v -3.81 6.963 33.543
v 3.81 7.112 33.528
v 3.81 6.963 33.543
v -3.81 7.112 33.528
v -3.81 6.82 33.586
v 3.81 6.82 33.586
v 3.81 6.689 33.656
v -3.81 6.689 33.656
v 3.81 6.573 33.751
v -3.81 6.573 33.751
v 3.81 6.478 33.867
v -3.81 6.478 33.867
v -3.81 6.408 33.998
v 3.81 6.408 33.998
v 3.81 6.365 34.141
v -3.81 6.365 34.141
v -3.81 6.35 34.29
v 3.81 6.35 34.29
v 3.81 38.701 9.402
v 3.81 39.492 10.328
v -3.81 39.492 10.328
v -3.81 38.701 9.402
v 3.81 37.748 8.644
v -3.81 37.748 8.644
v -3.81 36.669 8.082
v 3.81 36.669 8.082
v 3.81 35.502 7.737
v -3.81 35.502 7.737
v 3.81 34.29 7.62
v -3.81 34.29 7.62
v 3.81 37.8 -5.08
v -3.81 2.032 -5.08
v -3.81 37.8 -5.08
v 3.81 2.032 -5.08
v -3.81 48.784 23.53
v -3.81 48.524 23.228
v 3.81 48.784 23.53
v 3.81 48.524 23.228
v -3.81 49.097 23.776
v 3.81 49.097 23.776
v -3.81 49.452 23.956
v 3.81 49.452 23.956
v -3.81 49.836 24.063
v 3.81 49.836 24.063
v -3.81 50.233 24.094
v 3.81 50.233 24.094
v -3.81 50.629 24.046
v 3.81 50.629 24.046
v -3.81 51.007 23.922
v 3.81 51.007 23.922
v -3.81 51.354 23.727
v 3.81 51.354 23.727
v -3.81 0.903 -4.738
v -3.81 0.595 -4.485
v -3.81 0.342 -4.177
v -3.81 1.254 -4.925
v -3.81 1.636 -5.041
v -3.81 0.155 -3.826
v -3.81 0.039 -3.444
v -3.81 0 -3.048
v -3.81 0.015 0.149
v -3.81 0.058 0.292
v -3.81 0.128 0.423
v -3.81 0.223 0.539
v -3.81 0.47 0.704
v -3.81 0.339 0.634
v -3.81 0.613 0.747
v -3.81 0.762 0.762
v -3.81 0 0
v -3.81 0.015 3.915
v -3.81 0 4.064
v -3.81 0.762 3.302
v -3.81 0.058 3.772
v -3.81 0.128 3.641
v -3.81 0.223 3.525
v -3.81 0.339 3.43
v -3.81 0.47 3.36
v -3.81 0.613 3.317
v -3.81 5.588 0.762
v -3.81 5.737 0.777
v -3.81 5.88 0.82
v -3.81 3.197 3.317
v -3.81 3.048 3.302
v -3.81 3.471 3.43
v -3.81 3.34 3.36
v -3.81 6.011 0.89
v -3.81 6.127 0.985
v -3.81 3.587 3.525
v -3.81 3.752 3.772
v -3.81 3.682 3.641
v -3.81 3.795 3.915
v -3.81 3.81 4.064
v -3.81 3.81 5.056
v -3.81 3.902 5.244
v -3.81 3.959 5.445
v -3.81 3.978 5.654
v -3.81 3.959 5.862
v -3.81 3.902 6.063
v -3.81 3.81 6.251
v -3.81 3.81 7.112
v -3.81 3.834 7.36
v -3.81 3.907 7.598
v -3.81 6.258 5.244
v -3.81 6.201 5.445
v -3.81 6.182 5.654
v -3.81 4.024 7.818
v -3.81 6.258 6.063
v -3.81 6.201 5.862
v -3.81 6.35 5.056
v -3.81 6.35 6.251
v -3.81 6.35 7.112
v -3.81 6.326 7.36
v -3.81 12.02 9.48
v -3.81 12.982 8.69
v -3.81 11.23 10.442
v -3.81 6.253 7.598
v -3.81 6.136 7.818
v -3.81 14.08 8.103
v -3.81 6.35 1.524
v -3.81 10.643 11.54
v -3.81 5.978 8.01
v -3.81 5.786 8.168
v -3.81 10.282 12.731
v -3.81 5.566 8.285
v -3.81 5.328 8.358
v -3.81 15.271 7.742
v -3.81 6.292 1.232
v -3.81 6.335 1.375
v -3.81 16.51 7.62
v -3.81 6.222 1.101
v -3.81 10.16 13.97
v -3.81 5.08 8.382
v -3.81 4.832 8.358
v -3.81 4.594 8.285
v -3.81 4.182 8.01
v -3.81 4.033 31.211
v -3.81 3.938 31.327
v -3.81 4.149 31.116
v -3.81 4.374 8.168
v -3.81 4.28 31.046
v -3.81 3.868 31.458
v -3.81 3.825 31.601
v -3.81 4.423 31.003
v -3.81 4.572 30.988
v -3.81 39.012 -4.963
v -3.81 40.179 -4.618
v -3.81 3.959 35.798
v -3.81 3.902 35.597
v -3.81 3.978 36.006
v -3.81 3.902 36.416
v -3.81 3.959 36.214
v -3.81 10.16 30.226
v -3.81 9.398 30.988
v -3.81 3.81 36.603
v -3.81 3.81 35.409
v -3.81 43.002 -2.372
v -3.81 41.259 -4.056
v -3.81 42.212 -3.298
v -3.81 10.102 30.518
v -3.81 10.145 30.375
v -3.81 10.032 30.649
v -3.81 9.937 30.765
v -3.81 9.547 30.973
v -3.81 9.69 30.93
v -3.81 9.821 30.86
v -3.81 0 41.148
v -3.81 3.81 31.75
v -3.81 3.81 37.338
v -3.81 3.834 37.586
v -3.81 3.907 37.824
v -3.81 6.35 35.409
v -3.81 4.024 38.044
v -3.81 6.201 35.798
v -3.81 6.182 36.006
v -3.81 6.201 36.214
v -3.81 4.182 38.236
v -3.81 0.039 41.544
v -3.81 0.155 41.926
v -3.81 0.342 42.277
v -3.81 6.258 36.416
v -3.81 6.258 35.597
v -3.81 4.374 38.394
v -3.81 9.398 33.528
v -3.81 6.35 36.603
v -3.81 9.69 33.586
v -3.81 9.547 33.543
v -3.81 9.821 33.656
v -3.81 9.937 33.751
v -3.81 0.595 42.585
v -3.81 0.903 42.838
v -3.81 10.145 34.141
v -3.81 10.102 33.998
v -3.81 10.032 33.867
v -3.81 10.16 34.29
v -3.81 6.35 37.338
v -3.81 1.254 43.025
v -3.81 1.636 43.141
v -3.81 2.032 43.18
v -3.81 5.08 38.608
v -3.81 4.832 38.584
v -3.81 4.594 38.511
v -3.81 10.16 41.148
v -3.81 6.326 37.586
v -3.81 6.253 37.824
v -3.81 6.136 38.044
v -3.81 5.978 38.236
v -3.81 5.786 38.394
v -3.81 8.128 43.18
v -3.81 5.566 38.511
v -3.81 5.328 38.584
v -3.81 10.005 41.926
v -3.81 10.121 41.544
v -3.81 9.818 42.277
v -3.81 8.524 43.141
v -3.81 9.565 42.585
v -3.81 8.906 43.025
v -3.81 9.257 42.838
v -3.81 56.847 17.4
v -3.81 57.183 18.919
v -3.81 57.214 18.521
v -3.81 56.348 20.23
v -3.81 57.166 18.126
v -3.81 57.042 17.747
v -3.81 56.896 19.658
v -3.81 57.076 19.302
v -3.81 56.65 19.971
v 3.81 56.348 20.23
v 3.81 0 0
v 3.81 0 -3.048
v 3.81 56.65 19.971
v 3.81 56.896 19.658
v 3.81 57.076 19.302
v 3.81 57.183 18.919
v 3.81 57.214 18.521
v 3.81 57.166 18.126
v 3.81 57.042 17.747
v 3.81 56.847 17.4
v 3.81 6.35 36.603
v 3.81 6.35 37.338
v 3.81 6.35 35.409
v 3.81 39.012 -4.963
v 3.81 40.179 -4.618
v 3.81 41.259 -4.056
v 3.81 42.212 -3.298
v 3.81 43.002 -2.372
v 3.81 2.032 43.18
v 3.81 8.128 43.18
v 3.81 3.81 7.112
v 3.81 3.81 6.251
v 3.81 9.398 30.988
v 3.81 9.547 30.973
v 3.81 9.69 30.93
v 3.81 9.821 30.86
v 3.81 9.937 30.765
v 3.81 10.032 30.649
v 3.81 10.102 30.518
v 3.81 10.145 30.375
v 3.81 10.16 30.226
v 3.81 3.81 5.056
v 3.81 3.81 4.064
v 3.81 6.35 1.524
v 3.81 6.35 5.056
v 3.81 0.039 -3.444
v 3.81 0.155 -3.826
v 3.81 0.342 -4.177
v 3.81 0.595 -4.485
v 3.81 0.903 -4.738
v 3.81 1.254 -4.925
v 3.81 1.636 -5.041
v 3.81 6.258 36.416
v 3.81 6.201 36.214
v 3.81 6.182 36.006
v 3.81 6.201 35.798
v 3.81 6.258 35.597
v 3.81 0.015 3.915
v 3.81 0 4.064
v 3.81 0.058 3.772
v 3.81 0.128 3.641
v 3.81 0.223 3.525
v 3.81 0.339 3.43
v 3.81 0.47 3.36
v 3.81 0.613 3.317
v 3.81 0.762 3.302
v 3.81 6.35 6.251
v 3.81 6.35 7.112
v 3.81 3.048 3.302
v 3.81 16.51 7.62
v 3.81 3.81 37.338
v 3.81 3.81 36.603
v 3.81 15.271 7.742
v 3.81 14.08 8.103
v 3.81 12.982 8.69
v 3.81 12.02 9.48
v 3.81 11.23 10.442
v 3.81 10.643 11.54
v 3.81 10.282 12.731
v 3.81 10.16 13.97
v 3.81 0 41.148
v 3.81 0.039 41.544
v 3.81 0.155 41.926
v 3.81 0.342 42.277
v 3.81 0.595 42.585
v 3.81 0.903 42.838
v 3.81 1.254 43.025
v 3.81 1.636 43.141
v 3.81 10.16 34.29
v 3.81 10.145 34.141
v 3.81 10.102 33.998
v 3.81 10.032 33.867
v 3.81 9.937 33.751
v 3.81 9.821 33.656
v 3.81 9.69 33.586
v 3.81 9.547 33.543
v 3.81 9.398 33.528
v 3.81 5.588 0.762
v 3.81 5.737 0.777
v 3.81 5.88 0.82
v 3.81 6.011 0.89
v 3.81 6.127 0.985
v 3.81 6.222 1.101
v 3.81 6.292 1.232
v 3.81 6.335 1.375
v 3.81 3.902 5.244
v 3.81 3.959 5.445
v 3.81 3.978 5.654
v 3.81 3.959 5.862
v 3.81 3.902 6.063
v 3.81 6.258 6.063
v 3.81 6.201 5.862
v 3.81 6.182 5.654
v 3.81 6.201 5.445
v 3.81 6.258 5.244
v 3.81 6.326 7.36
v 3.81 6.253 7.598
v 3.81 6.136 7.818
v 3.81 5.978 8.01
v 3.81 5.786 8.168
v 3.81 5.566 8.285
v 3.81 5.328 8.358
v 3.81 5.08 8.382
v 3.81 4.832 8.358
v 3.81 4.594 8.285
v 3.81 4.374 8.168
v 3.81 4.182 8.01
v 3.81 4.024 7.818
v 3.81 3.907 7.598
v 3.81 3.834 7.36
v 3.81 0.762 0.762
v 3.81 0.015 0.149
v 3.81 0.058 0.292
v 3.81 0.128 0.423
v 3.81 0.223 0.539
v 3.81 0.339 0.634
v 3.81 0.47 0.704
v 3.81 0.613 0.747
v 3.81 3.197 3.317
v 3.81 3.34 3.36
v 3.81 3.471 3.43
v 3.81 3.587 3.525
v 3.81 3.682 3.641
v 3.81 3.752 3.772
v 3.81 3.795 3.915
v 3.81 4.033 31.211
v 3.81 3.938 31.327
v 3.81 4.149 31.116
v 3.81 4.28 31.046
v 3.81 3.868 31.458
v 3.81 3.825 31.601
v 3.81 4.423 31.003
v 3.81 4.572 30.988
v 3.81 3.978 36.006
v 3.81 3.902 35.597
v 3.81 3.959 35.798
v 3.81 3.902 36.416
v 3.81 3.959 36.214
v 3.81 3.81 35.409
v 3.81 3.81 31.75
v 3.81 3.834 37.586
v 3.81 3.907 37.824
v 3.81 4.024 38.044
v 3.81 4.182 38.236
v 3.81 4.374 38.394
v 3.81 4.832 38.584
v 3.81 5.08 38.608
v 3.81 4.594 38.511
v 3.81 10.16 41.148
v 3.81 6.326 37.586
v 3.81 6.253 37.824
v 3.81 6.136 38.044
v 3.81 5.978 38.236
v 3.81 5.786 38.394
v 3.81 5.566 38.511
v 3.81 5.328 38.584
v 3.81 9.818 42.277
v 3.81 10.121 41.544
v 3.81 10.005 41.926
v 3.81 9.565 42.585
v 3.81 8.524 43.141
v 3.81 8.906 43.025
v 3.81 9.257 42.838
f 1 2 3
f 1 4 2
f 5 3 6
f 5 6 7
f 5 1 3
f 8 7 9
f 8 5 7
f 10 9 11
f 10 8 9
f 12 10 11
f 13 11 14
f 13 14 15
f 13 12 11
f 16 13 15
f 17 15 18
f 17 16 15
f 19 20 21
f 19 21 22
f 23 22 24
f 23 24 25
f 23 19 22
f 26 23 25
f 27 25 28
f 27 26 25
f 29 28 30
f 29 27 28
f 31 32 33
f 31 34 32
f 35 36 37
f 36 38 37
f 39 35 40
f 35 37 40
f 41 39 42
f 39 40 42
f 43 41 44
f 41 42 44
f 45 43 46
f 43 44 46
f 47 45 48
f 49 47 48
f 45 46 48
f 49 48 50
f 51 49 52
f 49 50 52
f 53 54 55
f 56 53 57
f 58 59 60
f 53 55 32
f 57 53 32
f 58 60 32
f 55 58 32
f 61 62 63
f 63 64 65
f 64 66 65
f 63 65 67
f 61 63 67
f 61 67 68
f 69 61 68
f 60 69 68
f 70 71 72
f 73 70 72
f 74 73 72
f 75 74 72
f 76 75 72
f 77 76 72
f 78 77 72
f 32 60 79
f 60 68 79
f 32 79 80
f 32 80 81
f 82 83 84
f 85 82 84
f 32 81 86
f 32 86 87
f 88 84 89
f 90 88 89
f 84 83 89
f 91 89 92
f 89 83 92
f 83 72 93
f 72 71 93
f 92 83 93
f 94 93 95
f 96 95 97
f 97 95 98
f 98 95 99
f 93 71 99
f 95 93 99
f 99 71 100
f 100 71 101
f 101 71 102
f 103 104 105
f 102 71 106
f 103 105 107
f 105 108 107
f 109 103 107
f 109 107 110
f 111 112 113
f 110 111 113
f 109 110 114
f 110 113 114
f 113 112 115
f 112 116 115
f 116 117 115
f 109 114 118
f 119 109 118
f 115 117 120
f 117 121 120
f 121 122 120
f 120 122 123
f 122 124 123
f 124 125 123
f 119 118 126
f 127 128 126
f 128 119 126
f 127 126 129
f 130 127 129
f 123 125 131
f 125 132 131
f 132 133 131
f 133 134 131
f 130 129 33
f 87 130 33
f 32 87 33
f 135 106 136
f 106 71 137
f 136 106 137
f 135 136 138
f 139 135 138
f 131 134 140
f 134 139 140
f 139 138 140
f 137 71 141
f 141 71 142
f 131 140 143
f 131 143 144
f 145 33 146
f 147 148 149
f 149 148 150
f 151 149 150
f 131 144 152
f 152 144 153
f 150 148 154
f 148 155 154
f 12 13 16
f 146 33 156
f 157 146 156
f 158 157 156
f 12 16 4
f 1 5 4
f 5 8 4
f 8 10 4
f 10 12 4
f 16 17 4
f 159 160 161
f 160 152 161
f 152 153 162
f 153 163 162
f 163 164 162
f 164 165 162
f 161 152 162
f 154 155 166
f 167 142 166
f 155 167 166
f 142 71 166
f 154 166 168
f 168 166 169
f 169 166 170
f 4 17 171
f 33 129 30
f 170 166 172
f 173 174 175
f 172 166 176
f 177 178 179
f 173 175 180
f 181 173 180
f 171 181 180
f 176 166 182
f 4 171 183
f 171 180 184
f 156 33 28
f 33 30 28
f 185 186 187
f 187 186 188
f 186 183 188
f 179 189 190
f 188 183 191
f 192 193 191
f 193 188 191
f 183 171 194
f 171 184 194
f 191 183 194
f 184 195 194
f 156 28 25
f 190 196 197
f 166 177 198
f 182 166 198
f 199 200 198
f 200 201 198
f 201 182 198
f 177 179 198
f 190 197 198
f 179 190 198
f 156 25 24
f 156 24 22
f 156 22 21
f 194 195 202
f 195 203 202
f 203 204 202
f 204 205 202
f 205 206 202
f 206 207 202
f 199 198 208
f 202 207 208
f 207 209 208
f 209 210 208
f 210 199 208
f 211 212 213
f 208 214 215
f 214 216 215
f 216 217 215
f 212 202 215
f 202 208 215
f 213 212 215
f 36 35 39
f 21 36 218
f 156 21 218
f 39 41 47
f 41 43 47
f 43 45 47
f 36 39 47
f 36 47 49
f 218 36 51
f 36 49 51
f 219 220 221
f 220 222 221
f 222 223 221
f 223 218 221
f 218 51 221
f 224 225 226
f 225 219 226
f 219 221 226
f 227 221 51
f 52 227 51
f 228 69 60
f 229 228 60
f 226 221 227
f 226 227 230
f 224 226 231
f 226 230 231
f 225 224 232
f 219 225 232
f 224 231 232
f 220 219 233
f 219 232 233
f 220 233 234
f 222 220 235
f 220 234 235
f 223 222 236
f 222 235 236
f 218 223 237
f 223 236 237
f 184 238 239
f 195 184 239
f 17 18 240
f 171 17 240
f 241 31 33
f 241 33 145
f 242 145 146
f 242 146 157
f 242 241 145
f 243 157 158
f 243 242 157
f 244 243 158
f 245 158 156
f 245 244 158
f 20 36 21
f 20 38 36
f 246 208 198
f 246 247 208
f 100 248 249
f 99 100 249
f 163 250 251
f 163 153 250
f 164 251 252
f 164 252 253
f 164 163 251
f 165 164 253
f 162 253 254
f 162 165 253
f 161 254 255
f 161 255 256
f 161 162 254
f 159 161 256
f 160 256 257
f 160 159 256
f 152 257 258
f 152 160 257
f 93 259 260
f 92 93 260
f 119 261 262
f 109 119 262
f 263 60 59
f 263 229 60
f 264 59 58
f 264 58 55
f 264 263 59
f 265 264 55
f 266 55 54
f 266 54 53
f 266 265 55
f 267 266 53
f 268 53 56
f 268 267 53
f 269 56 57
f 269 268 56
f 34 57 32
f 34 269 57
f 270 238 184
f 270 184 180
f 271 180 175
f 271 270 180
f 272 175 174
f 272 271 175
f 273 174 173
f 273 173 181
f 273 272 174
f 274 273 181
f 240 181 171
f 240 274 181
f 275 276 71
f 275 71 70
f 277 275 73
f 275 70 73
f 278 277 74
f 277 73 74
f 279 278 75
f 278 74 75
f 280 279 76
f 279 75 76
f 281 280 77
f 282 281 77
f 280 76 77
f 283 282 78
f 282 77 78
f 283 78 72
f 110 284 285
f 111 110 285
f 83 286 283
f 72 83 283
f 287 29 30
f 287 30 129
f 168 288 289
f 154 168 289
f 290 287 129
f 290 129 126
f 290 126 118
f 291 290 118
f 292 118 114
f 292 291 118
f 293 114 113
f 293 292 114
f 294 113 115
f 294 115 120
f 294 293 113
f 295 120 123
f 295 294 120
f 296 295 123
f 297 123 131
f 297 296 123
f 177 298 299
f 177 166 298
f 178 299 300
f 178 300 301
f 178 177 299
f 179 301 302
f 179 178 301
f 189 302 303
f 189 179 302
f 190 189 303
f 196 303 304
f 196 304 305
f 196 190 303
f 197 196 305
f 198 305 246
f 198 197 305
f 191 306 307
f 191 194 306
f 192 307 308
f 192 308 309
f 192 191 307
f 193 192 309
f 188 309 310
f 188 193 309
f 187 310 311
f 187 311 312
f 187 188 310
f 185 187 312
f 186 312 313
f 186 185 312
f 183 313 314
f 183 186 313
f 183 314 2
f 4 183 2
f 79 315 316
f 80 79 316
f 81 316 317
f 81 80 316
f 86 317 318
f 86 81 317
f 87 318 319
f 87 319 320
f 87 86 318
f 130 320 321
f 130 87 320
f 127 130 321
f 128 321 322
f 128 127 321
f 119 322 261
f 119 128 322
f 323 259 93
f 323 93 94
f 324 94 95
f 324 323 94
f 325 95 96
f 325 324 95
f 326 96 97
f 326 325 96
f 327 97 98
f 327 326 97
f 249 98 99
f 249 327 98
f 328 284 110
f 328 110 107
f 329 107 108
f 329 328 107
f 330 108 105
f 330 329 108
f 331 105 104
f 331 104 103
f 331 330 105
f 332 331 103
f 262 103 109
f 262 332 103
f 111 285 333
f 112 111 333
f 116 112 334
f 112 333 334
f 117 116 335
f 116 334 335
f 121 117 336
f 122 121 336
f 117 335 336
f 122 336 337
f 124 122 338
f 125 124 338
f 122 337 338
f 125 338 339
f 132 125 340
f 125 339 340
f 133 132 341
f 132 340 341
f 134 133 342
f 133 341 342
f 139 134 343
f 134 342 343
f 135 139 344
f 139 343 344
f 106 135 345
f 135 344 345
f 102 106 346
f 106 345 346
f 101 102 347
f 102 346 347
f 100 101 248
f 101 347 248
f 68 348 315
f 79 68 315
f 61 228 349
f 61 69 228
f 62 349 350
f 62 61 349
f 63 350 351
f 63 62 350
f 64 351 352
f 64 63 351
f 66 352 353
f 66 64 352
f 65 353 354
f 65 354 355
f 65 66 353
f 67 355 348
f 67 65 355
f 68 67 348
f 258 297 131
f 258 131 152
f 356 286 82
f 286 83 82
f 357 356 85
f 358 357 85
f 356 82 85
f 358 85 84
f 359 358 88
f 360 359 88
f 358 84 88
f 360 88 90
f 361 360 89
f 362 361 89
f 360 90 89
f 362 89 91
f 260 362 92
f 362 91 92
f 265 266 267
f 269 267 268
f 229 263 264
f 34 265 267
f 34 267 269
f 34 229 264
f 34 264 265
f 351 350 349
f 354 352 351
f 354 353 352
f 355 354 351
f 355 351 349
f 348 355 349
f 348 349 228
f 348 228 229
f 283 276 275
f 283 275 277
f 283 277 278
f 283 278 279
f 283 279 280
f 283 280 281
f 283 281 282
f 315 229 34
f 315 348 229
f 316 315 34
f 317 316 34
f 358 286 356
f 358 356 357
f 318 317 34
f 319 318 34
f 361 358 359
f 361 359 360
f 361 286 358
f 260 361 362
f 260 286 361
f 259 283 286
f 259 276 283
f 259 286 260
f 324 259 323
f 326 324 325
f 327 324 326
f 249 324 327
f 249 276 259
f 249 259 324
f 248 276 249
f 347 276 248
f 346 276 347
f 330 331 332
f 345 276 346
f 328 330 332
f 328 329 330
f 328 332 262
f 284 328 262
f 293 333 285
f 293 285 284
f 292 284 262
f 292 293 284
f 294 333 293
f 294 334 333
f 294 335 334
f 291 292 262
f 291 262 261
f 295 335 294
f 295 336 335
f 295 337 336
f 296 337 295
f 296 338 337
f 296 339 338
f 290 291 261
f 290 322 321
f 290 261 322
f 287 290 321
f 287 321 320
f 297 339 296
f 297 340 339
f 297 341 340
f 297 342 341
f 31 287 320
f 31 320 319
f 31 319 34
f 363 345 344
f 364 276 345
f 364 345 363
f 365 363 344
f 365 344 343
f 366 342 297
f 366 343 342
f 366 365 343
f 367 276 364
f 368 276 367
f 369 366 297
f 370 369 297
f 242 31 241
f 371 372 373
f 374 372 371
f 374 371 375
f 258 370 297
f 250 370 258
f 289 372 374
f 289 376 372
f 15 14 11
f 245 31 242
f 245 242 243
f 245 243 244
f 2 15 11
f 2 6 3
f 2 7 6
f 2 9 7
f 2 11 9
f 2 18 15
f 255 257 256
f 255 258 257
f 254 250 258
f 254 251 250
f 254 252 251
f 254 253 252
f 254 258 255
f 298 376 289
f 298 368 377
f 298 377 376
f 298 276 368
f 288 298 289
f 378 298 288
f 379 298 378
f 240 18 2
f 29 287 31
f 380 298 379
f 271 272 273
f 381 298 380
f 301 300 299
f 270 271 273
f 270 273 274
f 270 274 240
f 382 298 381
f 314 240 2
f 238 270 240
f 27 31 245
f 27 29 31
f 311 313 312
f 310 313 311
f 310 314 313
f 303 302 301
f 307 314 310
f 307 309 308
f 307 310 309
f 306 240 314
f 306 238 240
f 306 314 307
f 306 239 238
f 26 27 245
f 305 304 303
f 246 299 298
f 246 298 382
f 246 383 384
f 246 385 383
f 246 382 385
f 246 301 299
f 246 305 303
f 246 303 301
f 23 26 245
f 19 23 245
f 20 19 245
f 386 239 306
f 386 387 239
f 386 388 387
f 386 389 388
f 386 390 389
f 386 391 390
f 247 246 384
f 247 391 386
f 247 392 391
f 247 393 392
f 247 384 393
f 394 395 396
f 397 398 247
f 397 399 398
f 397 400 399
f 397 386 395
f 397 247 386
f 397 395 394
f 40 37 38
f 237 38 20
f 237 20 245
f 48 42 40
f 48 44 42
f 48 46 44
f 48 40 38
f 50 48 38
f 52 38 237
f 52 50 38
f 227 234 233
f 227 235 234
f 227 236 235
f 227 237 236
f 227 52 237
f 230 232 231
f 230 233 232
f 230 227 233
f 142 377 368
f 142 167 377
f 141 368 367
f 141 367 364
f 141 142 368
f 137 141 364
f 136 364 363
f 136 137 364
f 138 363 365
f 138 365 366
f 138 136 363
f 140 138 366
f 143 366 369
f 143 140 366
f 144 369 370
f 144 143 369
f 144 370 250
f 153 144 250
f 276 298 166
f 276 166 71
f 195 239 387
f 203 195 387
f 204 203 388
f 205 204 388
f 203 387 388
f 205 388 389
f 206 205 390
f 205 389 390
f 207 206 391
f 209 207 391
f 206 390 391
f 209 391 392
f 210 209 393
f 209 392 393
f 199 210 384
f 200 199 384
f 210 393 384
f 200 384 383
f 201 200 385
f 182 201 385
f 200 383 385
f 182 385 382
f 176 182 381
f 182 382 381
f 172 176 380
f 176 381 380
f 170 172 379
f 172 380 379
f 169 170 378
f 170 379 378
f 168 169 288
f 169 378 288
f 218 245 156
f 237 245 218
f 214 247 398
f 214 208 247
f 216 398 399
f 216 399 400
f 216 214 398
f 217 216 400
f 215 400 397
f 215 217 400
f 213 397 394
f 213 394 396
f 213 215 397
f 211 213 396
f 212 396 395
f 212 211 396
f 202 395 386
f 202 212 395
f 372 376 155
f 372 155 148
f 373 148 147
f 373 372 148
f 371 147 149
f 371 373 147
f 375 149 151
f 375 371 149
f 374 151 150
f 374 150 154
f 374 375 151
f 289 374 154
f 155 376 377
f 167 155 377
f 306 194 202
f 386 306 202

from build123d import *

# Parameters (mm, degrees)
F1_DEPTH = 3.81
F2_R     = 2.032
F4_DEPTH = 7.621
F5_R     = 0.762
F7_DEPTH = 7.62


# Not quite as in the source:
# - a feature names something its author has since deleted; it is built from what else it names


with BuildPart() as f1:
    # F0 (on Right) → F1 (new body, symmetric)
    with BuildSketch(Plane.YZ):
        with BuildLine():
            Line((0, 43.18), (0, 0))
            Line((0, 0), (0, -5.08))
            Line((0, -5.08), (37.8004340866, -5.08))
            ThreePointArc((37.8004340866, -5.08), (40.7325377806, -4.3625187907), (43.0020495678, -2.3722103708))
            Line((43.0020495678, -2.3722103708), (58.0123892895, 19.0647763833))
            Line((58.0123892895, 19.0647763833), (49.6898045196, 24.8923129766))
            Line((49.6898045196, 24.8923129766), (39.4916154812, 10.3277896292))
            ThreePointArc((39.4916154812, 10.3277896292), (37.222103694, 8.3374812093), (34.29, 7.62))
            Line((34.29, 7.62), (16.51, 7.62))
            ThreePointArc((16.51, 7.62), (12.0198719395, 9.4798719395), (10.16, 13.97))
            Line((10.16, 13.97), (10.16, 43.18))
            Line((10.16, 43.18), (0, 43.18))
        make_face()
    extrude(amount=F1_DEPTH, both=True)

    # F2
    f2_edges = [f1.edges().sort_by_distance(p)[0] for p in [
        (0, 10.16, 43.18),
        (0, 0, 43.18),
        (0, 49.689805, 24.892313),
        (0, 58.012389, 19.064776),
        (0, 0, -5.08),
    ]]
    fillet(f2_edges, radius=F2_R)

    # F3 (on face) → F4 (cut, through all)
    with BuildSketch(Plane.YZ.offset(3.81)):
        with BuildLine():
            Line((6.35, 33.528), (6.35, 37.338))
            ThreePointArc((6.35, 37.338), (5.08, 38.608), (3.81, 37.338))
            Line((3.81, 37.338), (3.81, 30.988))
            Line((3.81, 30.988), (10.16, 30.988))
            Line((10.16, 30.988), (10.16, 33.528))
            Line((10.16, 33.528), (6.35, 33.528))
        make_face()
        with BuildLine():
            Line((6.35, 0.762), (6.35, 7.112))
            ThreePointArc((6.35, 7.112), (5.08, 8.382), (3.81, 7.112))
            Line((3.81, 7.112), (3.81, 3.302))
            Line((3.81, 3.302), (0, 3.302))
            Line((0, 3.302), (0, 0.762))
            Line((0, 0.762), (6.35, 0.762))
        make_face()
    extrude(amount=-F4_DEPTH, mode=Mode.SUBTRACT)

    # F5
    f5_edges = [f1.edges().sort_by_distance(p)[0] for p in [
        (0, 6.35, 33.528),
        (0, 10.16, 33.528),
        (0, 3.81, 30.988),
        (0, 10.16, 30.988),
        (0, 0, 3.302),
        (0, 6.35, 0.762),
        (0, 0, 0.762),
        (0, 3.81, 3.302),
    ]]
    fillet(f5_edges, radius=F5_R)

    # F6 (on face) → F7 (join, through all)
    with BuildSketch(Plane.YZ.offset(3.81)):
        with BuildLine():
            Line((6.35, 35.4090145557), (6.35, 36.6031861632))
            ThreePointArc((6.35, 36.6031861632), (6.1816473942, 36.0061003594), (6.35, 35.4090145557))
        make_face()
        with BuildLine():
            Line((3.81, 36.6031861632), (3.81, 35.4090145557))
            ThreePointArc((3.81, 35.4090145557), (3.9783526058, 36.0061003594), (3.81, 36.6031861632))
        make_face()
        with BuildLine():
            Line((3.81, 6.2505925306), (3.81, 5.0564209231))
            ThreePointArc((3.81, 5.0564209231), (3.9783526058, 5.6535067269), (3.81, 6.2505925306))
        make_face()
        with BuildLine():
            ThreePointArc((6.35, 6.2505925306), (6.1816473942, 5.6535067269), (6.35, 5.0564209231))
            Line((6.35, 5.0564209231), (6.35, 6.2505925306))
        make_face()
    extrude(amount=-F7_DEPTH)


solid = f1.part
